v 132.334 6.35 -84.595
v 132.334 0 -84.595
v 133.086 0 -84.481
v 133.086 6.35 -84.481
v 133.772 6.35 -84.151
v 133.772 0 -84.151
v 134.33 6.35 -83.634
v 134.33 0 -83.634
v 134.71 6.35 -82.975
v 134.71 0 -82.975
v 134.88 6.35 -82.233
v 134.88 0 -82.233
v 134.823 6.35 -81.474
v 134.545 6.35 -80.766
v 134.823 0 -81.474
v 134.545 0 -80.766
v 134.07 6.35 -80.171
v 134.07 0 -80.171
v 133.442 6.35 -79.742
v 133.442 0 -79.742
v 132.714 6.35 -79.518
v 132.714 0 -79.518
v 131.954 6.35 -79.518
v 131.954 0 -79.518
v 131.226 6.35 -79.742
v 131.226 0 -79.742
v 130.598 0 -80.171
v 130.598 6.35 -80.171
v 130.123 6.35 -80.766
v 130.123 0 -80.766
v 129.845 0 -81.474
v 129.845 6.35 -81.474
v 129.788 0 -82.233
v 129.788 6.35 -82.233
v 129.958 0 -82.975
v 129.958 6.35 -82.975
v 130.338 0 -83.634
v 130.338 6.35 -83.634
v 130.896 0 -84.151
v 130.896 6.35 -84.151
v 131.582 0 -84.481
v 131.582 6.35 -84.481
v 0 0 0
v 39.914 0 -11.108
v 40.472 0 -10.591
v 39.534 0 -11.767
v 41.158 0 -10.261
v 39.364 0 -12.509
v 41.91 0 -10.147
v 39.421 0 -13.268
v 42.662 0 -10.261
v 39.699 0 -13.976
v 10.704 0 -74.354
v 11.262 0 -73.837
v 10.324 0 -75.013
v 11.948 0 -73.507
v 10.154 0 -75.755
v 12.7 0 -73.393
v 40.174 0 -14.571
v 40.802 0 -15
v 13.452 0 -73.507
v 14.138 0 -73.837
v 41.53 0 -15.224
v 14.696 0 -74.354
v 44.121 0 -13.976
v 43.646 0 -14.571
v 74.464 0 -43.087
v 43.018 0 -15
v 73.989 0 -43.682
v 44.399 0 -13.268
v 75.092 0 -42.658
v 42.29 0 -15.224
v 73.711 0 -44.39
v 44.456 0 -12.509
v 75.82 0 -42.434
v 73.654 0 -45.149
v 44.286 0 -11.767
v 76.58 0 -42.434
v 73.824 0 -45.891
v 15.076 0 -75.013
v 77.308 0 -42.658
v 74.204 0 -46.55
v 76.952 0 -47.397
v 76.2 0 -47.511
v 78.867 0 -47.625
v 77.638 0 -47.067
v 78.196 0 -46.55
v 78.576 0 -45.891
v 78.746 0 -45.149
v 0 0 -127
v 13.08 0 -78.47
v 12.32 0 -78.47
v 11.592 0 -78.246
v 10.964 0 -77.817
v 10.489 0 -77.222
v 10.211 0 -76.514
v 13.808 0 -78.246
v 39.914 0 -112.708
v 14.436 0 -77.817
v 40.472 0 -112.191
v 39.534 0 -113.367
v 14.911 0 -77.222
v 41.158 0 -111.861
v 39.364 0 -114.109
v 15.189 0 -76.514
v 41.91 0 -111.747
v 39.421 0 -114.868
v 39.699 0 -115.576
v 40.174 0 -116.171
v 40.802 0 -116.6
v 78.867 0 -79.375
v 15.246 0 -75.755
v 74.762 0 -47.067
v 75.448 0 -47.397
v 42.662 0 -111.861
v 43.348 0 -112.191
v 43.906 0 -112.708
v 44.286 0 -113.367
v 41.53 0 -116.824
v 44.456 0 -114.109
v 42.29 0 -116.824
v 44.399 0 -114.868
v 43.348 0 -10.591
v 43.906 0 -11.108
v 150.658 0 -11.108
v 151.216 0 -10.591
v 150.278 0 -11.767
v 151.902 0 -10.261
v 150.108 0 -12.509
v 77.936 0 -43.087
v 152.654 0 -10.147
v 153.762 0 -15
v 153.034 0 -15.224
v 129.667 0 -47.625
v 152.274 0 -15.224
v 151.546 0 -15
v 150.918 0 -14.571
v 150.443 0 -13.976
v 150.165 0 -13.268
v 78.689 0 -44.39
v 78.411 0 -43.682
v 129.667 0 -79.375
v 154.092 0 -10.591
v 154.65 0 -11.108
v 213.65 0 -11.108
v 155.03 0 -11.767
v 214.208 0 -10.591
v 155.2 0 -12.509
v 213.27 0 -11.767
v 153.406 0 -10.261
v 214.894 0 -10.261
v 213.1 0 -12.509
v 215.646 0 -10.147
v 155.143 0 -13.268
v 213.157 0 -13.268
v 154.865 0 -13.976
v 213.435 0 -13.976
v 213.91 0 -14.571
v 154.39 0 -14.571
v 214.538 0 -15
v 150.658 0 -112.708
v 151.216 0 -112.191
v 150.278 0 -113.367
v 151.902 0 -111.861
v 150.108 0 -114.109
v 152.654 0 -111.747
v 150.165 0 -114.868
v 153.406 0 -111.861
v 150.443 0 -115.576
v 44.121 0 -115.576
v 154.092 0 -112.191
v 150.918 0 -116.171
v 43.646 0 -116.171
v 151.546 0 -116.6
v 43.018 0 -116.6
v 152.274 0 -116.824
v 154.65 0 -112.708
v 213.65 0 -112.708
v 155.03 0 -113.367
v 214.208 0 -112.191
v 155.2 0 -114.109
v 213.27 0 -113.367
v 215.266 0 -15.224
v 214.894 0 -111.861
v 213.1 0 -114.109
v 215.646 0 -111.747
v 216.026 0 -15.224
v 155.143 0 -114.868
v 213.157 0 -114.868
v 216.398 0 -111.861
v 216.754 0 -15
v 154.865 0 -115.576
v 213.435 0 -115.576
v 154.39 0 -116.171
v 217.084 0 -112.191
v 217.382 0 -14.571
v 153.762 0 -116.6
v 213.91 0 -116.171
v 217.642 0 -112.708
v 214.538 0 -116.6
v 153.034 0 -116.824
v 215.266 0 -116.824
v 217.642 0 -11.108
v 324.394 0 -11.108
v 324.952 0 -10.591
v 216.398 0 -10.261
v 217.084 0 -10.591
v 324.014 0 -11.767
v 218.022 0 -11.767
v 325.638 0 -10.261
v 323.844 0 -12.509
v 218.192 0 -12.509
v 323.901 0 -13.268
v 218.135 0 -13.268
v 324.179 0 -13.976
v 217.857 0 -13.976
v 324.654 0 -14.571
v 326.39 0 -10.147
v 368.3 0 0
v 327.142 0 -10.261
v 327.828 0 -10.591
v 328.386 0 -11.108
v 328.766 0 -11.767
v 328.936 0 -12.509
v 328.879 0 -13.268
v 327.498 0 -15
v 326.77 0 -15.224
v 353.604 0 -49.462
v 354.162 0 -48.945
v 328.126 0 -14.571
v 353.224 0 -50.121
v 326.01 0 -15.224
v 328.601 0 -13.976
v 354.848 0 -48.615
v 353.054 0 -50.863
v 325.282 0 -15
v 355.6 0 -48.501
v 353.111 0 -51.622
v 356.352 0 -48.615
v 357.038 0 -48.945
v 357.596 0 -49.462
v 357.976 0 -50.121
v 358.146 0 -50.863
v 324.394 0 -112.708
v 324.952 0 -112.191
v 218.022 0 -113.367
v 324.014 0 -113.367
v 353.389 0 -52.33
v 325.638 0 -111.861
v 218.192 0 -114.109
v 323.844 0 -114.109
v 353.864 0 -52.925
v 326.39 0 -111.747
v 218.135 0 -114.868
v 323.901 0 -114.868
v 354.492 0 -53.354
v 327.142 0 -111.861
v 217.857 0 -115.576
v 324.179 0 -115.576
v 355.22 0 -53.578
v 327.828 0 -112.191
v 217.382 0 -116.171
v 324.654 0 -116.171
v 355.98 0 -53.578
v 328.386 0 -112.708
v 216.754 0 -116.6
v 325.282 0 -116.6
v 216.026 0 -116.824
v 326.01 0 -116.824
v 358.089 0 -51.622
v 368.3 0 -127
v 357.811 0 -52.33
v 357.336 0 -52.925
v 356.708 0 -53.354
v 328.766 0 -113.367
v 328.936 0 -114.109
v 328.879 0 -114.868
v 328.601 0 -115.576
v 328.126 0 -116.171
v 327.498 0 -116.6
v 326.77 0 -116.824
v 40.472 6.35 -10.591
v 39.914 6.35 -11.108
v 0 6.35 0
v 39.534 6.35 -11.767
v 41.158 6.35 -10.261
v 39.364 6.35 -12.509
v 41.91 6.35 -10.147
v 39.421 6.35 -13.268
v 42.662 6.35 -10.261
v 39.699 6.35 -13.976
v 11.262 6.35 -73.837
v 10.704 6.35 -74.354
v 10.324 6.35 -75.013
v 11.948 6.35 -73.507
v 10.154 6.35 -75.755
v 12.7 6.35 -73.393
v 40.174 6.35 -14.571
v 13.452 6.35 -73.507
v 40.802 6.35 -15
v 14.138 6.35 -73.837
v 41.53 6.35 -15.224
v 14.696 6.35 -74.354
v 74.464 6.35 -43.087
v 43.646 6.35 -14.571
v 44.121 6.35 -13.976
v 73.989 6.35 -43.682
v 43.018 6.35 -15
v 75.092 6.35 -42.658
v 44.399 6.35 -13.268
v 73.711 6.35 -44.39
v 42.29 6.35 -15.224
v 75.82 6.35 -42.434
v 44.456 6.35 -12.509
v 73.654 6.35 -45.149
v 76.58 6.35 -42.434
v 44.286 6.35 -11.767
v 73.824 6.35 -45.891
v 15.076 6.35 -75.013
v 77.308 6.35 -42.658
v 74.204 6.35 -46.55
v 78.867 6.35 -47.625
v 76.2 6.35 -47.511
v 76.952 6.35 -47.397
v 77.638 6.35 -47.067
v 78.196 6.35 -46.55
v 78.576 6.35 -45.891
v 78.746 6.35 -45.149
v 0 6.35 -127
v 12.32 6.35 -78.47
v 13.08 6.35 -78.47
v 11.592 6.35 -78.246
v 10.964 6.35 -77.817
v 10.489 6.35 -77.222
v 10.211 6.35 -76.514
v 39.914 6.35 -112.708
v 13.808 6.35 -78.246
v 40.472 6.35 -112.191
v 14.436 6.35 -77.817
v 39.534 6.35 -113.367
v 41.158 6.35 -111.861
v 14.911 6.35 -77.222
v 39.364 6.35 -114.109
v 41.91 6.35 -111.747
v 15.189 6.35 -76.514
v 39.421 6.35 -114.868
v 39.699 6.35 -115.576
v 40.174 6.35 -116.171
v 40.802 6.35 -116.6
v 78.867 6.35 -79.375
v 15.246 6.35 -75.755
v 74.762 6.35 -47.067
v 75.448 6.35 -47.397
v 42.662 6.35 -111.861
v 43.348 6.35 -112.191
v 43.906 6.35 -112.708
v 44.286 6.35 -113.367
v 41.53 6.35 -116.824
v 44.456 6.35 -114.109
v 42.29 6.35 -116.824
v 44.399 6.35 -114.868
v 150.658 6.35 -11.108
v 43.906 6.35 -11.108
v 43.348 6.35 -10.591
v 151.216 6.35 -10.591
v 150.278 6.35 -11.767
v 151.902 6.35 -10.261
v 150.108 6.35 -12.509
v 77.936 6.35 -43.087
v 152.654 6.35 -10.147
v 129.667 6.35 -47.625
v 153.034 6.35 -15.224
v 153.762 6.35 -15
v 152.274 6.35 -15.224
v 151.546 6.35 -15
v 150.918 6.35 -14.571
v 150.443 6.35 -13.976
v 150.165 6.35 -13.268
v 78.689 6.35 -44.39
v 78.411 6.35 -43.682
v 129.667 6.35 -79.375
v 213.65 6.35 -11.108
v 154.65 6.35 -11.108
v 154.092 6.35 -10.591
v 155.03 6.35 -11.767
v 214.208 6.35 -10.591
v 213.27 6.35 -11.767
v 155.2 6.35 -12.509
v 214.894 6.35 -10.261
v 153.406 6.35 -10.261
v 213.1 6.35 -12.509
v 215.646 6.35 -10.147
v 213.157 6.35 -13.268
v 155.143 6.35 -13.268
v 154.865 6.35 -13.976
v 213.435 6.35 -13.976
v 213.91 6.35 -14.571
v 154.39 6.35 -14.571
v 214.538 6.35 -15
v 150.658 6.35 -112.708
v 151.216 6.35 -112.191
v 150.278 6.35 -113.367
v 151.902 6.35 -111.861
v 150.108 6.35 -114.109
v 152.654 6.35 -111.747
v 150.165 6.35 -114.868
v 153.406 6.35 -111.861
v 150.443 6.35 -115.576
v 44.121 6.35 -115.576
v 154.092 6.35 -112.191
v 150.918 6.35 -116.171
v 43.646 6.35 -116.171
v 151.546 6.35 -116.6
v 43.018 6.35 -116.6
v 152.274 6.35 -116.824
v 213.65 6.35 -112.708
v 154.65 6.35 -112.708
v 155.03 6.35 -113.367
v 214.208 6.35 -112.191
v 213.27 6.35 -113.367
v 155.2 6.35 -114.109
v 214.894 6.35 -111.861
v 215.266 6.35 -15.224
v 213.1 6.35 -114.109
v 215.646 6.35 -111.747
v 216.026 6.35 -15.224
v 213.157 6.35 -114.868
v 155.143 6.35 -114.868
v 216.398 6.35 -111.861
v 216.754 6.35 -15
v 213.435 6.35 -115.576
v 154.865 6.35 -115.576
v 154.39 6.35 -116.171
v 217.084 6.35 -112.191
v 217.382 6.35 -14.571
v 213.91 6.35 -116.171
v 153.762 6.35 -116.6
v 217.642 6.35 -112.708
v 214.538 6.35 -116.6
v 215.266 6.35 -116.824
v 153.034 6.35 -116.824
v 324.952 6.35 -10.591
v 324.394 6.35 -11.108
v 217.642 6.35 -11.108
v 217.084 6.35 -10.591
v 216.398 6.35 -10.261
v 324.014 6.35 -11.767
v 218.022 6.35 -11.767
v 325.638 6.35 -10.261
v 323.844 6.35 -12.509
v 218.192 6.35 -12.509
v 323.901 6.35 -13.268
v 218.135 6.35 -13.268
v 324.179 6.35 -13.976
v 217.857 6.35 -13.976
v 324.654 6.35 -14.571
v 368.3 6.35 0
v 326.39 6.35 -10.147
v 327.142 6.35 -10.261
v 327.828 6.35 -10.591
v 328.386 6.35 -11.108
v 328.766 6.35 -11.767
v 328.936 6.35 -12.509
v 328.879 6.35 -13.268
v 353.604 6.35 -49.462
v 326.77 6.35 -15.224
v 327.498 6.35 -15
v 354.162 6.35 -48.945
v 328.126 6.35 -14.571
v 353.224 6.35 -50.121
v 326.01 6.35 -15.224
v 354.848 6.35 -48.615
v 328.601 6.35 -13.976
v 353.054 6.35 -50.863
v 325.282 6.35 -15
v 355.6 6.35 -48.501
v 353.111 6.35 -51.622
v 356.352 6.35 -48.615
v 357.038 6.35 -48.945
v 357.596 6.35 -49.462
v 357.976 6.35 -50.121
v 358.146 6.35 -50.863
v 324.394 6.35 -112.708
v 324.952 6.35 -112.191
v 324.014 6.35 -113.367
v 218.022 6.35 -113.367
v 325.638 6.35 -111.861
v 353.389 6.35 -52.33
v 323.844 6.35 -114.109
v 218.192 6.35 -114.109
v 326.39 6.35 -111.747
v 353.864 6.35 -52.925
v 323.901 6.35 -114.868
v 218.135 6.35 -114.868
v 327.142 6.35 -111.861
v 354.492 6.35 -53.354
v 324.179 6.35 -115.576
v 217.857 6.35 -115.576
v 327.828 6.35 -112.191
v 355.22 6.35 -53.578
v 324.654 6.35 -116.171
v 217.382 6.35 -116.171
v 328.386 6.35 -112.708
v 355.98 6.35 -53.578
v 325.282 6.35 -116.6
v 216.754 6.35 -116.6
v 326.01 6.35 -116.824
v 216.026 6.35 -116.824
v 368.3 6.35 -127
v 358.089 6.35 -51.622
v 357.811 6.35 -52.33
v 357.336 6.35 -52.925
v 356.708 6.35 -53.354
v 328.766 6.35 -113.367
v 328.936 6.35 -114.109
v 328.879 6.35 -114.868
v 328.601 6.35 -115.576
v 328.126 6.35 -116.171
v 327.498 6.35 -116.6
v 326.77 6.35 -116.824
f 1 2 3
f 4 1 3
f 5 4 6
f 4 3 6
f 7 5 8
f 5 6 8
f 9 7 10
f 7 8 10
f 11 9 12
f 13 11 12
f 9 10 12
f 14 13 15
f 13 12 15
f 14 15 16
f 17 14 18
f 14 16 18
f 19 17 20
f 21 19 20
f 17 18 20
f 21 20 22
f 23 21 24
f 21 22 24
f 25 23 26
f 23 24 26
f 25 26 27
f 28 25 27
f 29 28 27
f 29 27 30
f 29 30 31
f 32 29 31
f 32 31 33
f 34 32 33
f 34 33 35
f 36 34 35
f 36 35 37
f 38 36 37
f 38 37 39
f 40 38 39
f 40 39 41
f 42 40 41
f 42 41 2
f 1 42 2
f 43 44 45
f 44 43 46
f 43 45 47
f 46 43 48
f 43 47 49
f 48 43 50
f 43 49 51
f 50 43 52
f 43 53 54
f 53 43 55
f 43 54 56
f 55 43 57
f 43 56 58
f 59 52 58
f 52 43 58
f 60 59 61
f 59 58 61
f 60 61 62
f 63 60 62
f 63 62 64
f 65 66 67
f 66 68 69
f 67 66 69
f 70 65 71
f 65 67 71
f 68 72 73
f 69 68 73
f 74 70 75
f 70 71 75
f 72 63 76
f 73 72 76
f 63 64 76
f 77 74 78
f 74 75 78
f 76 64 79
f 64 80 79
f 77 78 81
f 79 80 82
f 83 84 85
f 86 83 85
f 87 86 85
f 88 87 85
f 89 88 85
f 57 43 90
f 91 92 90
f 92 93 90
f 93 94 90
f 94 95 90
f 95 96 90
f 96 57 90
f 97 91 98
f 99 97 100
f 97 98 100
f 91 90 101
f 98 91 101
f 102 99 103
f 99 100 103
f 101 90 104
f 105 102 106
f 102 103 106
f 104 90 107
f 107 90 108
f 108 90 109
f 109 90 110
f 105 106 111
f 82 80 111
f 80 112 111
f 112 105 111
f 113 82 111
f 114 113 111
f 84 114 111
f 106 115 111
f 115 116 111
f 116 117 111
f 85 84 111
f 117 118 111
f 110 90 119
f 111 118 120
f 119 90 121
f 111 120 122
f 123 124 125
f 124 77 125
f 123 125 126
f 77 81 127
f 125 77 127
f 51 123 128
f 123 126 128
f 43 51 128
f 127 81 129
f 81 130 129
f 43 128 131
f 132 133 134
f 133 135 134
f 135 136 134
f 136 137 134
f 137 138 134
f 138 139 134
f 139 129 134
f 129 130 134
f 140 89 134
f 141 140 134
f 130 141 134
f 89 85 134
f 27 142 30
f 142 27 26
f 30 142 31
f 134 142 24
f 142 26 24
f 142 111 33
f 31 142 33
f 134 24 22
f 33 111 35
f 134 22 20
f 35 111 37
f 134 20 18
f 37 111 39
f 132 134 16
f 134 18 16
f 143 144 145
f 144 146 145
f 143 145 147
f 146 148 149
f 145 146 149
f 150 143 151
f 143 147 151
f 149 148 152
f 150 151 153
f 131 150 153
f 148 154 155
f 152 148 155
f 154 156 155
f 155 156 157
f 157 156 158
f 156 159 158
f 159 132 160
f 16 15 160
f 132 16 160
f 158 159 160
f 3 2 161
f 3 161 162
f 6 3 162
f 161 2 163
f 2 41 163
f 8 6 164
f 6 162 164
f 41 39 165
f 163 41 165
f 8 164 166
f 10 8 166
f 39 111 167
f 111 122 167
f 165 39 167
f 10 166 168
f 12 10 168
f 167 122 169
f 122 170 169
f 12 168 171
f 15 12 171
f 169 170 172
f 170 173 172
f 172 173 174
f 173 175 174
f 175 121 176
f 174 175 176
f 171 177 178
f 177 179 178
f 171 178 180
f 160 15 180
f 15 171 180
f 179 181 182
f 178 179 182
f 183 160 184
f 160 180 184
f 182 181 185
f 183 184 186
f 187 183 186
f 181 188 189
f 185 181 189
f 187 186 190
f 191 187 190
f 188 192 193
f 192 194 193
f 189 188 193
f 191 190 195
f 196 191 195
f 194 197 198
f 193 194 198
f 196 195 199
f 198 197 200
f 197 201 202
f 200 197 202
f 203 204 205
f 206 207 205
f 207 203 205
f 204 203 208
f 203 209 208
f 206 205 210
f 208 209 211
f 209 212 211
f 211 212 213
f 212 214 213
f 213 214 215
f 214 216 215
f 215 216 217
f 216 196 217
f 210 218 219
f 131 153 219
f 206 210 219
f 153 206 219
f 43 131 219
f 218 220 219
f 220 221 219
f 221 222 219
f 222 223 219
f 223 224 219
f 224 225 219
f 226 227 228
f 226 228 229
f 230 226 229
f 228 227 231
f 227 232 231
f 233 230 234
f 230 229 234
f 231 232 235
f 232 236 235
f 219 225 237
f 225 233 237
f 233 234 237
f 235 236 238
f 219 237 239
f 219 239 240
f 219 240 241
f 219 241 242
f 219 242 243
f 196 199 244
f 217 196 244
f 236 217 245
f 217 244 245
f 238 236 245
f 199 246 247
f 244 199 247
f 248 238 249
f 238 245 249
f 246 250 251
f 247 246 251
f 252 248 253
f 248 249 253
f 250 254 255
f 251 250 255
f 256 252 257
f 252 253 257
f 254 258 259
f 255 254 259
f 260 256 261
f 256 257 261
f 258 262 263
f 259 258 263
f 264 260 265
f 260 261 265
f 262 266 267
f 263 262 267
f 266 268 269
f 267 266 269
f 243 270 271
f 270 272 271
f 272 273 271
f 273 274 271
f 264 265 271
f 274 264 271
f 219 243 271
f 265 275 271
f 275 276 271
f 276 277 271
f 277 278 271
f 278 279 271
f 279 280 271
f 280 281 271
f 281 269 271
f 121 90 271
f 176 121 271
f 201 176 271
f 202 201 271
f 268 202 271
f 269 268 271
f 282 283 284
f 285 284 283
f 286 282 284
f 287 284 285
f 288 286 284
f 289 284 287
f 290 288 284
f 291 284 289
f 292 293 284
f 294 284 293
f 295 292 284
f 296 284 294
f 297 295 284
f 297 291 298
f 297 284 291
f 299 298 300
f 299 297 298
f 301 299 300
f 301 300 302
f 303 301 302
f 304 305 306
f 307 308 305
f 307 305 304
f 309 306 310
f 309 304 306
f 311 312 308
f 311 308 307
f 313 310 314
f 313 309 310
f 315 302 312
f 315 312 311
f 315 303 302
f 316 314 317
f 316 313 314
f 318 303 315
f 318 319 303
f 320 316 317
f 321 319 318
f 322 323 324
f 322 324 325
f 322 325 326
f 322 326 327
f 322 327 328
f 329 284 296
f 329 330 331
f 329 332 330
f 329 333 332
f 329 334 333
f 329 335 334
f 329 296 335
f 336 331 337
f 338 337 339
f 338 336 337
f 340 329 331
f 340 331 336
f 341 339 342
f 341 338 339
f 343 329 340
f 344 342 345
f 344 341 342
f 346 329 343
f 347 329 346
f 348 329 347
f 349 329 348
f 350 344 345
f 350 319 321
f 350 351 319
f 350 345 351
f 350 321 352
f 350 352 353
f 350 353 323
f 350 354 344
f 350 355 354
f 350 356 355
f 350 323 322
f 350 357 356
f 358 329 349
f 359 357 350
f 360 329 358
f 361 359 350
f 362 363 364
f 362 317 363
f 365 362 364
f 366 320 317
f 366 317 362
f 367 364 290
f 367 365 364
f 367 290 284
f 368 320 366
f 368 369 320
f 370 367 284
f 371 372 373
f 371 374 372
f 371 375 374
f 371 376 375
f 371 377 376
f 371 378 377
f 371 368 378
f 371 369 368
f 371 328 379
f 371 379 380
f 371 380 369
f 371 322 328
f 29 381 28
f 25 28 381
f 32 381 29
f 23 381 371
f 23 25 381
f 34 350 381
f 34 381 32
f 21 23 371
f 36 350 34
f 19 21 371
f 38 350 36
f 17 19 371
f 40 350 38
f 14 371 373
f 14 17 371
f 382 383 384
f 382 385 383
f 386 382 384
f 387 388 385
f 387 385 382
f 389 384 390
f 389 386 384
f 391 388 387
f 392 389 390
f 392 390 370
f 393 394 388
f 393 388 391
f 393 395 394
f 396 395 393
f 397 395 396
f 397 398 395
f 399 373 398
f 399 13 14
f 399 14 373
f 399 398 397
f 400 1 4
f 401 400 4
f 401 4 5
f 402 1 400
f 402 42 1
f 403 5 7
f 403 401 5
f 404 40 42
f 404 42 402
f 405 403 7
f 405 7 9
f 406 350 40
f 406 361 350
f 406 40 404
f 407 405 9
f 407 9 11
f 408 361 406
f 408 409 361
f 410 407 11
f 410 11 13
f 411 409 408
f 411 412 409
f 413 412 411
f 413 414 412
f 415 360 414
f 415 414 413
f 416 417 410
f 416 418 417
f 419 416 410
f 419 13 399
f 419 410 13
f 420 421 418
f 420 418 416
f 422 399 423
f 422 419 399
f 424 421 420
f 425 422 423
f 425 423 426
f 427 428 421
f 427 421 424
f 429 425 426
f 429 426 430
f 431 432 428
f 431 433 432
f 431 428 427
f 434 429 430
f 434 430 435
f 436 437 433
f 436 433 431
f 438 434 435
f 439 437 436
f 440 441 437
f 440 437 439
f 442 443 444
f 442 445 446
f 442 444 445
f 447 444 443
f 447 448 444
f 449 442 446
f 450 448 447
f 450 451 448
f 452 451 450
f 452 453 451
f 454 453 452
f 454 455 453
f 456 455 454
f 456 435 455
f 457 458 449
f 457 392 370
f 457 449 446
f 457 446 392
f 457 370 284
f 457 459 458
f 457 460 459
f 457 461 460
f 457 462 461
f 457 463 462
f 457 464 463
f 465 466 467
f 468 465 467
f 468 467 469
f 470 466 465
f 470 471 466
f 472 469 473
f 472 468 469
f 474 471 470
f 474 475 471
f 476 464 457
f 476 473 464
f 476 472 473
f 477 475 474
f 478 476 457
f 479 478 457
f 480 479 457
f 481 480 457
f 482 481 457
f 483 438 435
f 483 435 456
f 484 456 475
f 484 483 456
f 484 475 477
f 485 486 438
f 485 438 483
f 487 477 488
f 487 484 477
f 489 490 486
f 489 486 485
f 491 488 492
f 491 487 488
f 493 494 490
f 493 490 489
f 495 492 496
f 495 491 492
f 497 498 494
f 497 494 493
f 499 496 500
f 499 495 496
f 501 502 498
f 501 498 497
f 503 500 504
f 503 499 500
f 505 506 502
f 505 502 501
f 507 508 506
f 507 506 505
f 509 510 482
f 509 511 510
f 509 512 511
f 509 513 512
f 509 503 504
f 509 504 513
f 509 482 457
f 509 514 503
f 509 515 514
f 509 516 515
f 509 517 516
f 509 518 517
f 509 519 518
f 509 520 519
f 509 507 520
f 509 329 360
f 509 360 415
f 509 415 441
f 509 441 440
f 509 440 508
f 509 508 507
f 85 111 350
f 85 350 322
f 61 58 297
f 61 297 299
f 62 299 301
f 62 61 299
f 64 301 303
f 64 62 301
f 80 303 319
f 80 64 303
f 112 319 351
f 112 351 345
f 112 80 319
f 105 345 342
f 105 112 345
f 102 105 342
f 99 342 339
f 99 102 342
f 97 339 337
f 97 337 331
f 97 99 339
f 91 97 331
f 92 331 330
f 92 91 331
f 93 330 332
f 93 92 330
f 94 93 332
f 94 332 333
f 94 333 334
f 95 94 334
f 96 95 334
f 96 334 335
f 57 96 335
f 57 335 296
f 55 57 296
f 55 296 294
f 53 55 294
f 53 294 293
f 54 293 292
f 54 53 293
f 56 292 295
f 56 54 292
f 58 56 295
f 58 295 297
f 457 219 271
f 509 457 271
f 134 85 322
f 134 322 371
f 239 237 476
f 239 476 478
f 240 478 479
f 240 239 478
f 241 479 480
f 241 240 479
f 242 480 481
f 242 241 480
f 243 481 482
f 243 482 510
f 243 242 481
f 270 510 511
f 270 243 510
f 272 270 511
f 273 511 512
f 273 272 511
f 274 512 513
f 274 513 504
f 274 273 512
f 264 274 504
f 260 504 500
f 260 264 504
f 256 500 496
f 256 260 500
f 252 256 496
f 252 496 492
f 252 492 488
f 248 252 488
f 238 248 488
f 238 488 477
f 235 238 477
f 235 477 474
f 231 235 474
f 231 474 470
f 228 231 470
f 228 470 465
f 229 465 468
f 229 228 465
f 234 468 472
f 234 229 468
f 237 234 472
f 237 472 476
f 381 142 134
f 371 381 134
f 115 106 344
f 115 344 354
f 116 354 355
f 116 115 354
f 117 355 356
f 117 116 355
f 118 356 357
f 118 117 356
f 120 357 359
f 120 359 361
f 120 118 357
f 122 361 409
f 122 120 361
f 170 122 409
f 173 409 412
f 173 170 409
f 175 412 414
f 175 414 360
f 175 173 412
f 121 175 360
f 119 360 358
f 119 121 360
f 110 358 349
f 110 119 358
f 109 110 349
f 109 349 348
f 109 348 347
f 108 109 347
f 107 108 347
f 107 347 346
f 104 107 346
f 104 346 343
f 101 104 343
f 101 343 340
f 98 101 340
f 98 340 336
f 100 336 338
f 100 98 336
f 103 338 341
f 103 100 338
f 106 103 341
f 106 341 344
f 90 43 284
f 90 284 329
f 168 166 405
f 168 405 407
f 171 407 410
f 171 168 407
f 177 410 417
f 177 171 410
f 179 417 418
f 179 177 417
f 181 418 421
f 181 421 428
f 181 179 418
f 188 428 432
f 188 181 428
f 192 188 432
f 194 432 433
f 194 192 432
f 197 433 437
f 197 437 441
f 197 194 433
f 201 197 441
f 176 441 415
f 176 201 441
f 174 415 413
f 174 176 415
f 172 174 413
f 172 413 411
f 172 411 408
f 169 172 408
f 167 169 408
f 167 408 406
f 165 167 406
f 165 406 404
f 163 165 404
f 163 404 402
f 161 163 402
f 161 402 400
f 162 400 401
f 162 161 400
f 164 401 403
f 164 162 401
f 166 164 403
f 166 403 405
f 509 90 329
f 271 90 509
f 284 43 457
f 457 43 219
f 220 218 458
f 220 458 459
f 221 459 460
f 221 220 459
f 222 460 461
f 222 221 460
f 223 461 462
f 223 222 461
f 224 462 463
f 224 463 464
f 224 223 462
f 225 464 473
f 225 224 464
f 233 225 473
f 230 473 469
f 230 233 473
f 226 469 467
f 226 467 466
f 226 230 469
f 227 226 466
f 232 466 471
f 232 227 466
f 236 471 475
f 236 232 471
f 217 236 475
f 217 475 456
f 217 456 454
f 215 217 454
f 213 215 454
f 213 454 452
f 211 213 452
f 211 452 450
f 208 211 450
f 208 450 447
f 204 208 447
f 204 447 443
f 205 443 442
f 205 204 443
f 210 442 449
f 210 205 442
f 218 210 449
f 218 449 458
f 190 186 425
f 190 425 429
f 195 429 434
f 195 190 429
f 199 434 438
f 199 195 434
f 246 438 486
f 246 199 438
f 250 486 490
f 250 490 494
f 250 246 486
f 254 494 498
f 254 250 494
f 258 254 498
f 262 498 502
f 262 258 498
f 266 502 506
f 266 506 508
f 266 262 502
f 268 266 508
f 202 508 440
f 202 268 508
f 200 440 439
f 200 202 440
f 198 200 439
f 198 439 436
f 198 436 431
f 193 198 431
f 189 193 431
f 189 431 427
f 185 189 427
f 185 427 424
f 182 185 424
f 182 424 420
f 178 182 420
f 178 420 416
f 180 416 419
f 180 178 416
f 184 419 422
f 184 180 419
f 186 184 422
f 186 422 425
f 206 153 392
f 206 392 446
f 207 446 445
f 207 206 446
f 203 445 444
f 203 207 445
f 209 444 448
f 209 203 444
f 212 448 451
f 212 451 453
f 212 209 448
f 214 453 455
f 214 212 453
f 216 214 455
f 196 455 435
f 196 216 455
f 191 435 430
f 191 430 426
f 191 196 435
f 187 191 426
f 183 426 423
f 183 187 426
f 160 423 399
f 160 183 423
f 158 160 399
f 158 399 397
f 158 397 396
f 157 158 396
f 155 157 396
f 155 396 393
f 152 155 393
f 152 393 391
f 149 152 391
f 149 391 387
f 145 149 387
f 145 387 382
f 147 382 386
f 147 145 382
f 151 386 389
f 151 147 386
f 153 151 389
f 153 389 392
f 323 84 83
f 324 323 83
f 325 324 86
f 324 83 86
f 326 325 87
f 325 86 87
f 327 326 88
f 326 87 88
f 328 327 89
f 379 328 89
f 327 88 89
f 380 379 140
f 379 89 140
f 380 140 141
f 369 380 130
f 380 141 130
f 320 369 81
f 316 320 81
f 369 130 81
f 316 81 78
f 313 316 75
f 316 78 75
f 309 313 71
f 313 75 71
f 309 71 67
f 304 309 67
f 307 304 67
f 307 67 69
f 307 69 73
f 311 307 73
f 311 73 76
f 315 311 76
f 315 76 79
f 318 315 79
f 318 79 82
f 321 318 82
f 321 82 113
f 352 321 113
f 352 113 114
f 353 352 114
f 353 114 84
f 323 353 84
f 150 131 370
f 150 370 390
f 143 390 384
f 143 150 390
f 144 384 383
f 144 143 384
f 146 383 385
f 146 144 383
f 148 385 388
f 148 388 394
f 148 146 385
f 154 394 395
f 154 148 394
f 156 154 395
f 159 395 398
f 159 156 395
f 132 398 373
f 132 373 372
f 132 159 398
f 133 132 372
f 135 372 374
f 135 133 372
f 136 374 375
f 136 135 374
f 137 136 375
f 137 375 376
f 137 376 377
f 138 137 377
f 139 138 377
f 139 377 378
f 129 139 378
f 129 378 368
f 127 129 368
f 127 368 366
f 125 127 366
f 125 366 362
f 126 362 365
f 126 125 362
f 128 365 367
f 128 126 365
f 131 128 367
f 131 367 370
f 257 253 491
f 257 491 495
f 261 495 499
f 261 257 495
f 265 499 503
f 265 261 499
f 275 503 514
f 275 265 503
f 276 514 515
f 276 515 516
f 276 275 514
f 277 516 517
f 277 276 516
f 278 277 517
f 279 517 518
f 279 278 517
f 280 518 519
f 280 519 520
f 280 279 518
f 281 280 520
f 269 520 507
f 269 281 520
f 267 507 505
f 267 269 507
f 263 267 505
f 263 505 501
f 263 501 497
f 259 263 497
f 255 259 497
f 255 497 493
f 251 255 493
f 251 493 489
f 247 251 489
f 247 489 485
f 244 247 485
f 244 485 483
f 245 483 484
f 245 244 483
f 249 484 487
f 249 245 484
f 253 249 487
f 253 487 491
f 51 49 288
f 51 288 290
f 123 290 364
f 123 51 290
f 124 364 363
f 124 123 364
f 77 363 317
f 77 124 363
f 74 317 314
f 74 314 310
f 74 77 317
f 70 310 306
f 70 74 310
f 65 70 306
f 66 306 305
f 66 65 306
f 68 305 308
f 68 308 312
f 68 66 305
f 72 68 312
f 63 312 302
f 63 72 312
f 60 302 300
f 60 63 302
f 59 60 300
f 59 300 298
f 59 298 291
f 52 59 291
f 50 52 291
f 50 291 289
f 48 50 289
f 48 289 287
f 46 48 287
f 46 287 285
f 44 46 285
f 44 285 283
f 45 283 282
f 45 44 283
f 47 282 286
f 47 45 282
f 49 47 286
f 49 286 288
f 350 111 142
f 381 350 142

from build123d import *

# Parameters (mm, degrees)
SKETCH1_W           = 368.3
SKETCH1_H           = 127
SKETCH1_R           = 2.5527
BOSS_EXTRUDE1_DEPTH = 6.35
CUT_EXTRUDE1_REACH  = 391.633
SKETCH2_R           = 2.5527
SKETCH2_W           = 50.8
SKETCH2_H           = 31.75


with BuildPart() as part:
    # Sketch1 → Boss-Extrude1 (new body)
    with BuildSketch(Plane(origin=(0, 0, 0), x_dir=(1, 0, 0), z_dir=(0, 1, 0))):
        with Locations((184.15, 63.5)):
            Rectangle(SKETCH1_W, SKETCH1_H)
        with Locations(Location((326.39, 12.7, 0), (0, 0, 270))):
            Circle(SKETCH1_R, mode=Mode.SUBTRACT)
        with Locations(Location((41.91, 12.7, 0), (0, 0, 270))):
            Circle(SKETCH1_R, mode=Mode.SUBTRACT)
        with Locations(Location((41.91, 114.3, 0), (0, 0, 270))):
            Circle(SKETCH1_R, mode=Mode.SUBTRACT)
        with Locations(Location((326.39, 114.3, 0), (0, 0, 270))):
            Circle(SKETCH1_R, mode=Mode.SUBTRACT)
        with Locations(Location((215.646, 12.7, 0), (0, 0, 270))):
            Circle(SKETCH1_R, mode=Mode.SUBTRACT)
        with Locations(Location((152.654, 12.7, 0), (0, 0, 270))):
            Circle(SKETCH1_R, mode=Mode.SUBTRACT)
        with Locations(Location((215.646, 114.3, 0), (0, 0, 270))):
            Circle(SKETCH1_R, mode=Mode.SUBTRACT)
        with Locations(Location((152.654, 114.3, 0), (0, 0, 270))):
            Circle(SKETCH1_R, mode=Mode.SUBTRACT)
        with Locations(Location((12.7, 75.946, 0), (0, 0, 270))):
            Circle(SKETCH1_R, mode=Mode.SUBTRACT)
        with Locations(Location((355.6, 51.054, 0), (0, 0, 270))):
            Circle(SKETCH1_R, mode=Mode.SUBTRACT)
    extrude(amount=BOSS_EXTRUDE1_DEPTH)

    # Sketch2 → Cut-Extrude1 (cut, up to next)
    with BuildSketch(Plane.XZ, mode=Mode.PRIVATE) as cut_extrude1_sk1:
        with Locations(Location((76.2, -44.958, 0), (0, 0, 270))):
            Circle(SKETCH2_R)
    cut_extrude1_tool1 = extrude(cut_extrude1_sk1.sketch, amount=-CUT_EXTRUDE1_REACH, mode=Mode.PRIVATE) & part.part
    # Sketch2 → Cut-Extrude1 (cut, up to next)
    with BuildSketch(Plane.XZ, mode=Mode.PRIVATE) as cut_extrude1_sk2:
        with Locations(Location((132.334, -82.042, 0), (0, 0, 270))):
            Circle(SKETCH2_R)
    cut_extrude1_tool2 = extrude(cut_extrude1_sk2.sketch, amount=-CUT_EXTRUDE1_REACH, mode=Mode.PRIVATE) & part.part
    # Sketch2 → Cut-Extrude1 (cut, up to next)
    with BuildSketch(Plane.XZ, mode=Mode.PRIVATE) as cut_extrude1_sk3:
        with Locations((104.267, -63.5)):
            Rectangle(SKETCH2_W, SKETCH2_H)
    cut_extrude1_tool3 = extrude(cut_extrude1_sk3.sketch, amount=-CUT_EXTRUDE1_REACH, mode=Mode.PRIVATE) & part.part
    add(cut_extrude1_tool1.solids().sort_by_distance((76.2, 0, -44.958))[0], mode=Mode.SUBTRACT)
    add(cut_extrude1_tool2.solids().sort_by_distance((132.334, 0, -82.042))[0], mode=Mode.SUBTRACT)
    add(cut_extrude1_tool3.solids().sort_by_distance((104.267, 0, -63.5))[0], mode=Mode.SUBTRACT)


solid = part.part
